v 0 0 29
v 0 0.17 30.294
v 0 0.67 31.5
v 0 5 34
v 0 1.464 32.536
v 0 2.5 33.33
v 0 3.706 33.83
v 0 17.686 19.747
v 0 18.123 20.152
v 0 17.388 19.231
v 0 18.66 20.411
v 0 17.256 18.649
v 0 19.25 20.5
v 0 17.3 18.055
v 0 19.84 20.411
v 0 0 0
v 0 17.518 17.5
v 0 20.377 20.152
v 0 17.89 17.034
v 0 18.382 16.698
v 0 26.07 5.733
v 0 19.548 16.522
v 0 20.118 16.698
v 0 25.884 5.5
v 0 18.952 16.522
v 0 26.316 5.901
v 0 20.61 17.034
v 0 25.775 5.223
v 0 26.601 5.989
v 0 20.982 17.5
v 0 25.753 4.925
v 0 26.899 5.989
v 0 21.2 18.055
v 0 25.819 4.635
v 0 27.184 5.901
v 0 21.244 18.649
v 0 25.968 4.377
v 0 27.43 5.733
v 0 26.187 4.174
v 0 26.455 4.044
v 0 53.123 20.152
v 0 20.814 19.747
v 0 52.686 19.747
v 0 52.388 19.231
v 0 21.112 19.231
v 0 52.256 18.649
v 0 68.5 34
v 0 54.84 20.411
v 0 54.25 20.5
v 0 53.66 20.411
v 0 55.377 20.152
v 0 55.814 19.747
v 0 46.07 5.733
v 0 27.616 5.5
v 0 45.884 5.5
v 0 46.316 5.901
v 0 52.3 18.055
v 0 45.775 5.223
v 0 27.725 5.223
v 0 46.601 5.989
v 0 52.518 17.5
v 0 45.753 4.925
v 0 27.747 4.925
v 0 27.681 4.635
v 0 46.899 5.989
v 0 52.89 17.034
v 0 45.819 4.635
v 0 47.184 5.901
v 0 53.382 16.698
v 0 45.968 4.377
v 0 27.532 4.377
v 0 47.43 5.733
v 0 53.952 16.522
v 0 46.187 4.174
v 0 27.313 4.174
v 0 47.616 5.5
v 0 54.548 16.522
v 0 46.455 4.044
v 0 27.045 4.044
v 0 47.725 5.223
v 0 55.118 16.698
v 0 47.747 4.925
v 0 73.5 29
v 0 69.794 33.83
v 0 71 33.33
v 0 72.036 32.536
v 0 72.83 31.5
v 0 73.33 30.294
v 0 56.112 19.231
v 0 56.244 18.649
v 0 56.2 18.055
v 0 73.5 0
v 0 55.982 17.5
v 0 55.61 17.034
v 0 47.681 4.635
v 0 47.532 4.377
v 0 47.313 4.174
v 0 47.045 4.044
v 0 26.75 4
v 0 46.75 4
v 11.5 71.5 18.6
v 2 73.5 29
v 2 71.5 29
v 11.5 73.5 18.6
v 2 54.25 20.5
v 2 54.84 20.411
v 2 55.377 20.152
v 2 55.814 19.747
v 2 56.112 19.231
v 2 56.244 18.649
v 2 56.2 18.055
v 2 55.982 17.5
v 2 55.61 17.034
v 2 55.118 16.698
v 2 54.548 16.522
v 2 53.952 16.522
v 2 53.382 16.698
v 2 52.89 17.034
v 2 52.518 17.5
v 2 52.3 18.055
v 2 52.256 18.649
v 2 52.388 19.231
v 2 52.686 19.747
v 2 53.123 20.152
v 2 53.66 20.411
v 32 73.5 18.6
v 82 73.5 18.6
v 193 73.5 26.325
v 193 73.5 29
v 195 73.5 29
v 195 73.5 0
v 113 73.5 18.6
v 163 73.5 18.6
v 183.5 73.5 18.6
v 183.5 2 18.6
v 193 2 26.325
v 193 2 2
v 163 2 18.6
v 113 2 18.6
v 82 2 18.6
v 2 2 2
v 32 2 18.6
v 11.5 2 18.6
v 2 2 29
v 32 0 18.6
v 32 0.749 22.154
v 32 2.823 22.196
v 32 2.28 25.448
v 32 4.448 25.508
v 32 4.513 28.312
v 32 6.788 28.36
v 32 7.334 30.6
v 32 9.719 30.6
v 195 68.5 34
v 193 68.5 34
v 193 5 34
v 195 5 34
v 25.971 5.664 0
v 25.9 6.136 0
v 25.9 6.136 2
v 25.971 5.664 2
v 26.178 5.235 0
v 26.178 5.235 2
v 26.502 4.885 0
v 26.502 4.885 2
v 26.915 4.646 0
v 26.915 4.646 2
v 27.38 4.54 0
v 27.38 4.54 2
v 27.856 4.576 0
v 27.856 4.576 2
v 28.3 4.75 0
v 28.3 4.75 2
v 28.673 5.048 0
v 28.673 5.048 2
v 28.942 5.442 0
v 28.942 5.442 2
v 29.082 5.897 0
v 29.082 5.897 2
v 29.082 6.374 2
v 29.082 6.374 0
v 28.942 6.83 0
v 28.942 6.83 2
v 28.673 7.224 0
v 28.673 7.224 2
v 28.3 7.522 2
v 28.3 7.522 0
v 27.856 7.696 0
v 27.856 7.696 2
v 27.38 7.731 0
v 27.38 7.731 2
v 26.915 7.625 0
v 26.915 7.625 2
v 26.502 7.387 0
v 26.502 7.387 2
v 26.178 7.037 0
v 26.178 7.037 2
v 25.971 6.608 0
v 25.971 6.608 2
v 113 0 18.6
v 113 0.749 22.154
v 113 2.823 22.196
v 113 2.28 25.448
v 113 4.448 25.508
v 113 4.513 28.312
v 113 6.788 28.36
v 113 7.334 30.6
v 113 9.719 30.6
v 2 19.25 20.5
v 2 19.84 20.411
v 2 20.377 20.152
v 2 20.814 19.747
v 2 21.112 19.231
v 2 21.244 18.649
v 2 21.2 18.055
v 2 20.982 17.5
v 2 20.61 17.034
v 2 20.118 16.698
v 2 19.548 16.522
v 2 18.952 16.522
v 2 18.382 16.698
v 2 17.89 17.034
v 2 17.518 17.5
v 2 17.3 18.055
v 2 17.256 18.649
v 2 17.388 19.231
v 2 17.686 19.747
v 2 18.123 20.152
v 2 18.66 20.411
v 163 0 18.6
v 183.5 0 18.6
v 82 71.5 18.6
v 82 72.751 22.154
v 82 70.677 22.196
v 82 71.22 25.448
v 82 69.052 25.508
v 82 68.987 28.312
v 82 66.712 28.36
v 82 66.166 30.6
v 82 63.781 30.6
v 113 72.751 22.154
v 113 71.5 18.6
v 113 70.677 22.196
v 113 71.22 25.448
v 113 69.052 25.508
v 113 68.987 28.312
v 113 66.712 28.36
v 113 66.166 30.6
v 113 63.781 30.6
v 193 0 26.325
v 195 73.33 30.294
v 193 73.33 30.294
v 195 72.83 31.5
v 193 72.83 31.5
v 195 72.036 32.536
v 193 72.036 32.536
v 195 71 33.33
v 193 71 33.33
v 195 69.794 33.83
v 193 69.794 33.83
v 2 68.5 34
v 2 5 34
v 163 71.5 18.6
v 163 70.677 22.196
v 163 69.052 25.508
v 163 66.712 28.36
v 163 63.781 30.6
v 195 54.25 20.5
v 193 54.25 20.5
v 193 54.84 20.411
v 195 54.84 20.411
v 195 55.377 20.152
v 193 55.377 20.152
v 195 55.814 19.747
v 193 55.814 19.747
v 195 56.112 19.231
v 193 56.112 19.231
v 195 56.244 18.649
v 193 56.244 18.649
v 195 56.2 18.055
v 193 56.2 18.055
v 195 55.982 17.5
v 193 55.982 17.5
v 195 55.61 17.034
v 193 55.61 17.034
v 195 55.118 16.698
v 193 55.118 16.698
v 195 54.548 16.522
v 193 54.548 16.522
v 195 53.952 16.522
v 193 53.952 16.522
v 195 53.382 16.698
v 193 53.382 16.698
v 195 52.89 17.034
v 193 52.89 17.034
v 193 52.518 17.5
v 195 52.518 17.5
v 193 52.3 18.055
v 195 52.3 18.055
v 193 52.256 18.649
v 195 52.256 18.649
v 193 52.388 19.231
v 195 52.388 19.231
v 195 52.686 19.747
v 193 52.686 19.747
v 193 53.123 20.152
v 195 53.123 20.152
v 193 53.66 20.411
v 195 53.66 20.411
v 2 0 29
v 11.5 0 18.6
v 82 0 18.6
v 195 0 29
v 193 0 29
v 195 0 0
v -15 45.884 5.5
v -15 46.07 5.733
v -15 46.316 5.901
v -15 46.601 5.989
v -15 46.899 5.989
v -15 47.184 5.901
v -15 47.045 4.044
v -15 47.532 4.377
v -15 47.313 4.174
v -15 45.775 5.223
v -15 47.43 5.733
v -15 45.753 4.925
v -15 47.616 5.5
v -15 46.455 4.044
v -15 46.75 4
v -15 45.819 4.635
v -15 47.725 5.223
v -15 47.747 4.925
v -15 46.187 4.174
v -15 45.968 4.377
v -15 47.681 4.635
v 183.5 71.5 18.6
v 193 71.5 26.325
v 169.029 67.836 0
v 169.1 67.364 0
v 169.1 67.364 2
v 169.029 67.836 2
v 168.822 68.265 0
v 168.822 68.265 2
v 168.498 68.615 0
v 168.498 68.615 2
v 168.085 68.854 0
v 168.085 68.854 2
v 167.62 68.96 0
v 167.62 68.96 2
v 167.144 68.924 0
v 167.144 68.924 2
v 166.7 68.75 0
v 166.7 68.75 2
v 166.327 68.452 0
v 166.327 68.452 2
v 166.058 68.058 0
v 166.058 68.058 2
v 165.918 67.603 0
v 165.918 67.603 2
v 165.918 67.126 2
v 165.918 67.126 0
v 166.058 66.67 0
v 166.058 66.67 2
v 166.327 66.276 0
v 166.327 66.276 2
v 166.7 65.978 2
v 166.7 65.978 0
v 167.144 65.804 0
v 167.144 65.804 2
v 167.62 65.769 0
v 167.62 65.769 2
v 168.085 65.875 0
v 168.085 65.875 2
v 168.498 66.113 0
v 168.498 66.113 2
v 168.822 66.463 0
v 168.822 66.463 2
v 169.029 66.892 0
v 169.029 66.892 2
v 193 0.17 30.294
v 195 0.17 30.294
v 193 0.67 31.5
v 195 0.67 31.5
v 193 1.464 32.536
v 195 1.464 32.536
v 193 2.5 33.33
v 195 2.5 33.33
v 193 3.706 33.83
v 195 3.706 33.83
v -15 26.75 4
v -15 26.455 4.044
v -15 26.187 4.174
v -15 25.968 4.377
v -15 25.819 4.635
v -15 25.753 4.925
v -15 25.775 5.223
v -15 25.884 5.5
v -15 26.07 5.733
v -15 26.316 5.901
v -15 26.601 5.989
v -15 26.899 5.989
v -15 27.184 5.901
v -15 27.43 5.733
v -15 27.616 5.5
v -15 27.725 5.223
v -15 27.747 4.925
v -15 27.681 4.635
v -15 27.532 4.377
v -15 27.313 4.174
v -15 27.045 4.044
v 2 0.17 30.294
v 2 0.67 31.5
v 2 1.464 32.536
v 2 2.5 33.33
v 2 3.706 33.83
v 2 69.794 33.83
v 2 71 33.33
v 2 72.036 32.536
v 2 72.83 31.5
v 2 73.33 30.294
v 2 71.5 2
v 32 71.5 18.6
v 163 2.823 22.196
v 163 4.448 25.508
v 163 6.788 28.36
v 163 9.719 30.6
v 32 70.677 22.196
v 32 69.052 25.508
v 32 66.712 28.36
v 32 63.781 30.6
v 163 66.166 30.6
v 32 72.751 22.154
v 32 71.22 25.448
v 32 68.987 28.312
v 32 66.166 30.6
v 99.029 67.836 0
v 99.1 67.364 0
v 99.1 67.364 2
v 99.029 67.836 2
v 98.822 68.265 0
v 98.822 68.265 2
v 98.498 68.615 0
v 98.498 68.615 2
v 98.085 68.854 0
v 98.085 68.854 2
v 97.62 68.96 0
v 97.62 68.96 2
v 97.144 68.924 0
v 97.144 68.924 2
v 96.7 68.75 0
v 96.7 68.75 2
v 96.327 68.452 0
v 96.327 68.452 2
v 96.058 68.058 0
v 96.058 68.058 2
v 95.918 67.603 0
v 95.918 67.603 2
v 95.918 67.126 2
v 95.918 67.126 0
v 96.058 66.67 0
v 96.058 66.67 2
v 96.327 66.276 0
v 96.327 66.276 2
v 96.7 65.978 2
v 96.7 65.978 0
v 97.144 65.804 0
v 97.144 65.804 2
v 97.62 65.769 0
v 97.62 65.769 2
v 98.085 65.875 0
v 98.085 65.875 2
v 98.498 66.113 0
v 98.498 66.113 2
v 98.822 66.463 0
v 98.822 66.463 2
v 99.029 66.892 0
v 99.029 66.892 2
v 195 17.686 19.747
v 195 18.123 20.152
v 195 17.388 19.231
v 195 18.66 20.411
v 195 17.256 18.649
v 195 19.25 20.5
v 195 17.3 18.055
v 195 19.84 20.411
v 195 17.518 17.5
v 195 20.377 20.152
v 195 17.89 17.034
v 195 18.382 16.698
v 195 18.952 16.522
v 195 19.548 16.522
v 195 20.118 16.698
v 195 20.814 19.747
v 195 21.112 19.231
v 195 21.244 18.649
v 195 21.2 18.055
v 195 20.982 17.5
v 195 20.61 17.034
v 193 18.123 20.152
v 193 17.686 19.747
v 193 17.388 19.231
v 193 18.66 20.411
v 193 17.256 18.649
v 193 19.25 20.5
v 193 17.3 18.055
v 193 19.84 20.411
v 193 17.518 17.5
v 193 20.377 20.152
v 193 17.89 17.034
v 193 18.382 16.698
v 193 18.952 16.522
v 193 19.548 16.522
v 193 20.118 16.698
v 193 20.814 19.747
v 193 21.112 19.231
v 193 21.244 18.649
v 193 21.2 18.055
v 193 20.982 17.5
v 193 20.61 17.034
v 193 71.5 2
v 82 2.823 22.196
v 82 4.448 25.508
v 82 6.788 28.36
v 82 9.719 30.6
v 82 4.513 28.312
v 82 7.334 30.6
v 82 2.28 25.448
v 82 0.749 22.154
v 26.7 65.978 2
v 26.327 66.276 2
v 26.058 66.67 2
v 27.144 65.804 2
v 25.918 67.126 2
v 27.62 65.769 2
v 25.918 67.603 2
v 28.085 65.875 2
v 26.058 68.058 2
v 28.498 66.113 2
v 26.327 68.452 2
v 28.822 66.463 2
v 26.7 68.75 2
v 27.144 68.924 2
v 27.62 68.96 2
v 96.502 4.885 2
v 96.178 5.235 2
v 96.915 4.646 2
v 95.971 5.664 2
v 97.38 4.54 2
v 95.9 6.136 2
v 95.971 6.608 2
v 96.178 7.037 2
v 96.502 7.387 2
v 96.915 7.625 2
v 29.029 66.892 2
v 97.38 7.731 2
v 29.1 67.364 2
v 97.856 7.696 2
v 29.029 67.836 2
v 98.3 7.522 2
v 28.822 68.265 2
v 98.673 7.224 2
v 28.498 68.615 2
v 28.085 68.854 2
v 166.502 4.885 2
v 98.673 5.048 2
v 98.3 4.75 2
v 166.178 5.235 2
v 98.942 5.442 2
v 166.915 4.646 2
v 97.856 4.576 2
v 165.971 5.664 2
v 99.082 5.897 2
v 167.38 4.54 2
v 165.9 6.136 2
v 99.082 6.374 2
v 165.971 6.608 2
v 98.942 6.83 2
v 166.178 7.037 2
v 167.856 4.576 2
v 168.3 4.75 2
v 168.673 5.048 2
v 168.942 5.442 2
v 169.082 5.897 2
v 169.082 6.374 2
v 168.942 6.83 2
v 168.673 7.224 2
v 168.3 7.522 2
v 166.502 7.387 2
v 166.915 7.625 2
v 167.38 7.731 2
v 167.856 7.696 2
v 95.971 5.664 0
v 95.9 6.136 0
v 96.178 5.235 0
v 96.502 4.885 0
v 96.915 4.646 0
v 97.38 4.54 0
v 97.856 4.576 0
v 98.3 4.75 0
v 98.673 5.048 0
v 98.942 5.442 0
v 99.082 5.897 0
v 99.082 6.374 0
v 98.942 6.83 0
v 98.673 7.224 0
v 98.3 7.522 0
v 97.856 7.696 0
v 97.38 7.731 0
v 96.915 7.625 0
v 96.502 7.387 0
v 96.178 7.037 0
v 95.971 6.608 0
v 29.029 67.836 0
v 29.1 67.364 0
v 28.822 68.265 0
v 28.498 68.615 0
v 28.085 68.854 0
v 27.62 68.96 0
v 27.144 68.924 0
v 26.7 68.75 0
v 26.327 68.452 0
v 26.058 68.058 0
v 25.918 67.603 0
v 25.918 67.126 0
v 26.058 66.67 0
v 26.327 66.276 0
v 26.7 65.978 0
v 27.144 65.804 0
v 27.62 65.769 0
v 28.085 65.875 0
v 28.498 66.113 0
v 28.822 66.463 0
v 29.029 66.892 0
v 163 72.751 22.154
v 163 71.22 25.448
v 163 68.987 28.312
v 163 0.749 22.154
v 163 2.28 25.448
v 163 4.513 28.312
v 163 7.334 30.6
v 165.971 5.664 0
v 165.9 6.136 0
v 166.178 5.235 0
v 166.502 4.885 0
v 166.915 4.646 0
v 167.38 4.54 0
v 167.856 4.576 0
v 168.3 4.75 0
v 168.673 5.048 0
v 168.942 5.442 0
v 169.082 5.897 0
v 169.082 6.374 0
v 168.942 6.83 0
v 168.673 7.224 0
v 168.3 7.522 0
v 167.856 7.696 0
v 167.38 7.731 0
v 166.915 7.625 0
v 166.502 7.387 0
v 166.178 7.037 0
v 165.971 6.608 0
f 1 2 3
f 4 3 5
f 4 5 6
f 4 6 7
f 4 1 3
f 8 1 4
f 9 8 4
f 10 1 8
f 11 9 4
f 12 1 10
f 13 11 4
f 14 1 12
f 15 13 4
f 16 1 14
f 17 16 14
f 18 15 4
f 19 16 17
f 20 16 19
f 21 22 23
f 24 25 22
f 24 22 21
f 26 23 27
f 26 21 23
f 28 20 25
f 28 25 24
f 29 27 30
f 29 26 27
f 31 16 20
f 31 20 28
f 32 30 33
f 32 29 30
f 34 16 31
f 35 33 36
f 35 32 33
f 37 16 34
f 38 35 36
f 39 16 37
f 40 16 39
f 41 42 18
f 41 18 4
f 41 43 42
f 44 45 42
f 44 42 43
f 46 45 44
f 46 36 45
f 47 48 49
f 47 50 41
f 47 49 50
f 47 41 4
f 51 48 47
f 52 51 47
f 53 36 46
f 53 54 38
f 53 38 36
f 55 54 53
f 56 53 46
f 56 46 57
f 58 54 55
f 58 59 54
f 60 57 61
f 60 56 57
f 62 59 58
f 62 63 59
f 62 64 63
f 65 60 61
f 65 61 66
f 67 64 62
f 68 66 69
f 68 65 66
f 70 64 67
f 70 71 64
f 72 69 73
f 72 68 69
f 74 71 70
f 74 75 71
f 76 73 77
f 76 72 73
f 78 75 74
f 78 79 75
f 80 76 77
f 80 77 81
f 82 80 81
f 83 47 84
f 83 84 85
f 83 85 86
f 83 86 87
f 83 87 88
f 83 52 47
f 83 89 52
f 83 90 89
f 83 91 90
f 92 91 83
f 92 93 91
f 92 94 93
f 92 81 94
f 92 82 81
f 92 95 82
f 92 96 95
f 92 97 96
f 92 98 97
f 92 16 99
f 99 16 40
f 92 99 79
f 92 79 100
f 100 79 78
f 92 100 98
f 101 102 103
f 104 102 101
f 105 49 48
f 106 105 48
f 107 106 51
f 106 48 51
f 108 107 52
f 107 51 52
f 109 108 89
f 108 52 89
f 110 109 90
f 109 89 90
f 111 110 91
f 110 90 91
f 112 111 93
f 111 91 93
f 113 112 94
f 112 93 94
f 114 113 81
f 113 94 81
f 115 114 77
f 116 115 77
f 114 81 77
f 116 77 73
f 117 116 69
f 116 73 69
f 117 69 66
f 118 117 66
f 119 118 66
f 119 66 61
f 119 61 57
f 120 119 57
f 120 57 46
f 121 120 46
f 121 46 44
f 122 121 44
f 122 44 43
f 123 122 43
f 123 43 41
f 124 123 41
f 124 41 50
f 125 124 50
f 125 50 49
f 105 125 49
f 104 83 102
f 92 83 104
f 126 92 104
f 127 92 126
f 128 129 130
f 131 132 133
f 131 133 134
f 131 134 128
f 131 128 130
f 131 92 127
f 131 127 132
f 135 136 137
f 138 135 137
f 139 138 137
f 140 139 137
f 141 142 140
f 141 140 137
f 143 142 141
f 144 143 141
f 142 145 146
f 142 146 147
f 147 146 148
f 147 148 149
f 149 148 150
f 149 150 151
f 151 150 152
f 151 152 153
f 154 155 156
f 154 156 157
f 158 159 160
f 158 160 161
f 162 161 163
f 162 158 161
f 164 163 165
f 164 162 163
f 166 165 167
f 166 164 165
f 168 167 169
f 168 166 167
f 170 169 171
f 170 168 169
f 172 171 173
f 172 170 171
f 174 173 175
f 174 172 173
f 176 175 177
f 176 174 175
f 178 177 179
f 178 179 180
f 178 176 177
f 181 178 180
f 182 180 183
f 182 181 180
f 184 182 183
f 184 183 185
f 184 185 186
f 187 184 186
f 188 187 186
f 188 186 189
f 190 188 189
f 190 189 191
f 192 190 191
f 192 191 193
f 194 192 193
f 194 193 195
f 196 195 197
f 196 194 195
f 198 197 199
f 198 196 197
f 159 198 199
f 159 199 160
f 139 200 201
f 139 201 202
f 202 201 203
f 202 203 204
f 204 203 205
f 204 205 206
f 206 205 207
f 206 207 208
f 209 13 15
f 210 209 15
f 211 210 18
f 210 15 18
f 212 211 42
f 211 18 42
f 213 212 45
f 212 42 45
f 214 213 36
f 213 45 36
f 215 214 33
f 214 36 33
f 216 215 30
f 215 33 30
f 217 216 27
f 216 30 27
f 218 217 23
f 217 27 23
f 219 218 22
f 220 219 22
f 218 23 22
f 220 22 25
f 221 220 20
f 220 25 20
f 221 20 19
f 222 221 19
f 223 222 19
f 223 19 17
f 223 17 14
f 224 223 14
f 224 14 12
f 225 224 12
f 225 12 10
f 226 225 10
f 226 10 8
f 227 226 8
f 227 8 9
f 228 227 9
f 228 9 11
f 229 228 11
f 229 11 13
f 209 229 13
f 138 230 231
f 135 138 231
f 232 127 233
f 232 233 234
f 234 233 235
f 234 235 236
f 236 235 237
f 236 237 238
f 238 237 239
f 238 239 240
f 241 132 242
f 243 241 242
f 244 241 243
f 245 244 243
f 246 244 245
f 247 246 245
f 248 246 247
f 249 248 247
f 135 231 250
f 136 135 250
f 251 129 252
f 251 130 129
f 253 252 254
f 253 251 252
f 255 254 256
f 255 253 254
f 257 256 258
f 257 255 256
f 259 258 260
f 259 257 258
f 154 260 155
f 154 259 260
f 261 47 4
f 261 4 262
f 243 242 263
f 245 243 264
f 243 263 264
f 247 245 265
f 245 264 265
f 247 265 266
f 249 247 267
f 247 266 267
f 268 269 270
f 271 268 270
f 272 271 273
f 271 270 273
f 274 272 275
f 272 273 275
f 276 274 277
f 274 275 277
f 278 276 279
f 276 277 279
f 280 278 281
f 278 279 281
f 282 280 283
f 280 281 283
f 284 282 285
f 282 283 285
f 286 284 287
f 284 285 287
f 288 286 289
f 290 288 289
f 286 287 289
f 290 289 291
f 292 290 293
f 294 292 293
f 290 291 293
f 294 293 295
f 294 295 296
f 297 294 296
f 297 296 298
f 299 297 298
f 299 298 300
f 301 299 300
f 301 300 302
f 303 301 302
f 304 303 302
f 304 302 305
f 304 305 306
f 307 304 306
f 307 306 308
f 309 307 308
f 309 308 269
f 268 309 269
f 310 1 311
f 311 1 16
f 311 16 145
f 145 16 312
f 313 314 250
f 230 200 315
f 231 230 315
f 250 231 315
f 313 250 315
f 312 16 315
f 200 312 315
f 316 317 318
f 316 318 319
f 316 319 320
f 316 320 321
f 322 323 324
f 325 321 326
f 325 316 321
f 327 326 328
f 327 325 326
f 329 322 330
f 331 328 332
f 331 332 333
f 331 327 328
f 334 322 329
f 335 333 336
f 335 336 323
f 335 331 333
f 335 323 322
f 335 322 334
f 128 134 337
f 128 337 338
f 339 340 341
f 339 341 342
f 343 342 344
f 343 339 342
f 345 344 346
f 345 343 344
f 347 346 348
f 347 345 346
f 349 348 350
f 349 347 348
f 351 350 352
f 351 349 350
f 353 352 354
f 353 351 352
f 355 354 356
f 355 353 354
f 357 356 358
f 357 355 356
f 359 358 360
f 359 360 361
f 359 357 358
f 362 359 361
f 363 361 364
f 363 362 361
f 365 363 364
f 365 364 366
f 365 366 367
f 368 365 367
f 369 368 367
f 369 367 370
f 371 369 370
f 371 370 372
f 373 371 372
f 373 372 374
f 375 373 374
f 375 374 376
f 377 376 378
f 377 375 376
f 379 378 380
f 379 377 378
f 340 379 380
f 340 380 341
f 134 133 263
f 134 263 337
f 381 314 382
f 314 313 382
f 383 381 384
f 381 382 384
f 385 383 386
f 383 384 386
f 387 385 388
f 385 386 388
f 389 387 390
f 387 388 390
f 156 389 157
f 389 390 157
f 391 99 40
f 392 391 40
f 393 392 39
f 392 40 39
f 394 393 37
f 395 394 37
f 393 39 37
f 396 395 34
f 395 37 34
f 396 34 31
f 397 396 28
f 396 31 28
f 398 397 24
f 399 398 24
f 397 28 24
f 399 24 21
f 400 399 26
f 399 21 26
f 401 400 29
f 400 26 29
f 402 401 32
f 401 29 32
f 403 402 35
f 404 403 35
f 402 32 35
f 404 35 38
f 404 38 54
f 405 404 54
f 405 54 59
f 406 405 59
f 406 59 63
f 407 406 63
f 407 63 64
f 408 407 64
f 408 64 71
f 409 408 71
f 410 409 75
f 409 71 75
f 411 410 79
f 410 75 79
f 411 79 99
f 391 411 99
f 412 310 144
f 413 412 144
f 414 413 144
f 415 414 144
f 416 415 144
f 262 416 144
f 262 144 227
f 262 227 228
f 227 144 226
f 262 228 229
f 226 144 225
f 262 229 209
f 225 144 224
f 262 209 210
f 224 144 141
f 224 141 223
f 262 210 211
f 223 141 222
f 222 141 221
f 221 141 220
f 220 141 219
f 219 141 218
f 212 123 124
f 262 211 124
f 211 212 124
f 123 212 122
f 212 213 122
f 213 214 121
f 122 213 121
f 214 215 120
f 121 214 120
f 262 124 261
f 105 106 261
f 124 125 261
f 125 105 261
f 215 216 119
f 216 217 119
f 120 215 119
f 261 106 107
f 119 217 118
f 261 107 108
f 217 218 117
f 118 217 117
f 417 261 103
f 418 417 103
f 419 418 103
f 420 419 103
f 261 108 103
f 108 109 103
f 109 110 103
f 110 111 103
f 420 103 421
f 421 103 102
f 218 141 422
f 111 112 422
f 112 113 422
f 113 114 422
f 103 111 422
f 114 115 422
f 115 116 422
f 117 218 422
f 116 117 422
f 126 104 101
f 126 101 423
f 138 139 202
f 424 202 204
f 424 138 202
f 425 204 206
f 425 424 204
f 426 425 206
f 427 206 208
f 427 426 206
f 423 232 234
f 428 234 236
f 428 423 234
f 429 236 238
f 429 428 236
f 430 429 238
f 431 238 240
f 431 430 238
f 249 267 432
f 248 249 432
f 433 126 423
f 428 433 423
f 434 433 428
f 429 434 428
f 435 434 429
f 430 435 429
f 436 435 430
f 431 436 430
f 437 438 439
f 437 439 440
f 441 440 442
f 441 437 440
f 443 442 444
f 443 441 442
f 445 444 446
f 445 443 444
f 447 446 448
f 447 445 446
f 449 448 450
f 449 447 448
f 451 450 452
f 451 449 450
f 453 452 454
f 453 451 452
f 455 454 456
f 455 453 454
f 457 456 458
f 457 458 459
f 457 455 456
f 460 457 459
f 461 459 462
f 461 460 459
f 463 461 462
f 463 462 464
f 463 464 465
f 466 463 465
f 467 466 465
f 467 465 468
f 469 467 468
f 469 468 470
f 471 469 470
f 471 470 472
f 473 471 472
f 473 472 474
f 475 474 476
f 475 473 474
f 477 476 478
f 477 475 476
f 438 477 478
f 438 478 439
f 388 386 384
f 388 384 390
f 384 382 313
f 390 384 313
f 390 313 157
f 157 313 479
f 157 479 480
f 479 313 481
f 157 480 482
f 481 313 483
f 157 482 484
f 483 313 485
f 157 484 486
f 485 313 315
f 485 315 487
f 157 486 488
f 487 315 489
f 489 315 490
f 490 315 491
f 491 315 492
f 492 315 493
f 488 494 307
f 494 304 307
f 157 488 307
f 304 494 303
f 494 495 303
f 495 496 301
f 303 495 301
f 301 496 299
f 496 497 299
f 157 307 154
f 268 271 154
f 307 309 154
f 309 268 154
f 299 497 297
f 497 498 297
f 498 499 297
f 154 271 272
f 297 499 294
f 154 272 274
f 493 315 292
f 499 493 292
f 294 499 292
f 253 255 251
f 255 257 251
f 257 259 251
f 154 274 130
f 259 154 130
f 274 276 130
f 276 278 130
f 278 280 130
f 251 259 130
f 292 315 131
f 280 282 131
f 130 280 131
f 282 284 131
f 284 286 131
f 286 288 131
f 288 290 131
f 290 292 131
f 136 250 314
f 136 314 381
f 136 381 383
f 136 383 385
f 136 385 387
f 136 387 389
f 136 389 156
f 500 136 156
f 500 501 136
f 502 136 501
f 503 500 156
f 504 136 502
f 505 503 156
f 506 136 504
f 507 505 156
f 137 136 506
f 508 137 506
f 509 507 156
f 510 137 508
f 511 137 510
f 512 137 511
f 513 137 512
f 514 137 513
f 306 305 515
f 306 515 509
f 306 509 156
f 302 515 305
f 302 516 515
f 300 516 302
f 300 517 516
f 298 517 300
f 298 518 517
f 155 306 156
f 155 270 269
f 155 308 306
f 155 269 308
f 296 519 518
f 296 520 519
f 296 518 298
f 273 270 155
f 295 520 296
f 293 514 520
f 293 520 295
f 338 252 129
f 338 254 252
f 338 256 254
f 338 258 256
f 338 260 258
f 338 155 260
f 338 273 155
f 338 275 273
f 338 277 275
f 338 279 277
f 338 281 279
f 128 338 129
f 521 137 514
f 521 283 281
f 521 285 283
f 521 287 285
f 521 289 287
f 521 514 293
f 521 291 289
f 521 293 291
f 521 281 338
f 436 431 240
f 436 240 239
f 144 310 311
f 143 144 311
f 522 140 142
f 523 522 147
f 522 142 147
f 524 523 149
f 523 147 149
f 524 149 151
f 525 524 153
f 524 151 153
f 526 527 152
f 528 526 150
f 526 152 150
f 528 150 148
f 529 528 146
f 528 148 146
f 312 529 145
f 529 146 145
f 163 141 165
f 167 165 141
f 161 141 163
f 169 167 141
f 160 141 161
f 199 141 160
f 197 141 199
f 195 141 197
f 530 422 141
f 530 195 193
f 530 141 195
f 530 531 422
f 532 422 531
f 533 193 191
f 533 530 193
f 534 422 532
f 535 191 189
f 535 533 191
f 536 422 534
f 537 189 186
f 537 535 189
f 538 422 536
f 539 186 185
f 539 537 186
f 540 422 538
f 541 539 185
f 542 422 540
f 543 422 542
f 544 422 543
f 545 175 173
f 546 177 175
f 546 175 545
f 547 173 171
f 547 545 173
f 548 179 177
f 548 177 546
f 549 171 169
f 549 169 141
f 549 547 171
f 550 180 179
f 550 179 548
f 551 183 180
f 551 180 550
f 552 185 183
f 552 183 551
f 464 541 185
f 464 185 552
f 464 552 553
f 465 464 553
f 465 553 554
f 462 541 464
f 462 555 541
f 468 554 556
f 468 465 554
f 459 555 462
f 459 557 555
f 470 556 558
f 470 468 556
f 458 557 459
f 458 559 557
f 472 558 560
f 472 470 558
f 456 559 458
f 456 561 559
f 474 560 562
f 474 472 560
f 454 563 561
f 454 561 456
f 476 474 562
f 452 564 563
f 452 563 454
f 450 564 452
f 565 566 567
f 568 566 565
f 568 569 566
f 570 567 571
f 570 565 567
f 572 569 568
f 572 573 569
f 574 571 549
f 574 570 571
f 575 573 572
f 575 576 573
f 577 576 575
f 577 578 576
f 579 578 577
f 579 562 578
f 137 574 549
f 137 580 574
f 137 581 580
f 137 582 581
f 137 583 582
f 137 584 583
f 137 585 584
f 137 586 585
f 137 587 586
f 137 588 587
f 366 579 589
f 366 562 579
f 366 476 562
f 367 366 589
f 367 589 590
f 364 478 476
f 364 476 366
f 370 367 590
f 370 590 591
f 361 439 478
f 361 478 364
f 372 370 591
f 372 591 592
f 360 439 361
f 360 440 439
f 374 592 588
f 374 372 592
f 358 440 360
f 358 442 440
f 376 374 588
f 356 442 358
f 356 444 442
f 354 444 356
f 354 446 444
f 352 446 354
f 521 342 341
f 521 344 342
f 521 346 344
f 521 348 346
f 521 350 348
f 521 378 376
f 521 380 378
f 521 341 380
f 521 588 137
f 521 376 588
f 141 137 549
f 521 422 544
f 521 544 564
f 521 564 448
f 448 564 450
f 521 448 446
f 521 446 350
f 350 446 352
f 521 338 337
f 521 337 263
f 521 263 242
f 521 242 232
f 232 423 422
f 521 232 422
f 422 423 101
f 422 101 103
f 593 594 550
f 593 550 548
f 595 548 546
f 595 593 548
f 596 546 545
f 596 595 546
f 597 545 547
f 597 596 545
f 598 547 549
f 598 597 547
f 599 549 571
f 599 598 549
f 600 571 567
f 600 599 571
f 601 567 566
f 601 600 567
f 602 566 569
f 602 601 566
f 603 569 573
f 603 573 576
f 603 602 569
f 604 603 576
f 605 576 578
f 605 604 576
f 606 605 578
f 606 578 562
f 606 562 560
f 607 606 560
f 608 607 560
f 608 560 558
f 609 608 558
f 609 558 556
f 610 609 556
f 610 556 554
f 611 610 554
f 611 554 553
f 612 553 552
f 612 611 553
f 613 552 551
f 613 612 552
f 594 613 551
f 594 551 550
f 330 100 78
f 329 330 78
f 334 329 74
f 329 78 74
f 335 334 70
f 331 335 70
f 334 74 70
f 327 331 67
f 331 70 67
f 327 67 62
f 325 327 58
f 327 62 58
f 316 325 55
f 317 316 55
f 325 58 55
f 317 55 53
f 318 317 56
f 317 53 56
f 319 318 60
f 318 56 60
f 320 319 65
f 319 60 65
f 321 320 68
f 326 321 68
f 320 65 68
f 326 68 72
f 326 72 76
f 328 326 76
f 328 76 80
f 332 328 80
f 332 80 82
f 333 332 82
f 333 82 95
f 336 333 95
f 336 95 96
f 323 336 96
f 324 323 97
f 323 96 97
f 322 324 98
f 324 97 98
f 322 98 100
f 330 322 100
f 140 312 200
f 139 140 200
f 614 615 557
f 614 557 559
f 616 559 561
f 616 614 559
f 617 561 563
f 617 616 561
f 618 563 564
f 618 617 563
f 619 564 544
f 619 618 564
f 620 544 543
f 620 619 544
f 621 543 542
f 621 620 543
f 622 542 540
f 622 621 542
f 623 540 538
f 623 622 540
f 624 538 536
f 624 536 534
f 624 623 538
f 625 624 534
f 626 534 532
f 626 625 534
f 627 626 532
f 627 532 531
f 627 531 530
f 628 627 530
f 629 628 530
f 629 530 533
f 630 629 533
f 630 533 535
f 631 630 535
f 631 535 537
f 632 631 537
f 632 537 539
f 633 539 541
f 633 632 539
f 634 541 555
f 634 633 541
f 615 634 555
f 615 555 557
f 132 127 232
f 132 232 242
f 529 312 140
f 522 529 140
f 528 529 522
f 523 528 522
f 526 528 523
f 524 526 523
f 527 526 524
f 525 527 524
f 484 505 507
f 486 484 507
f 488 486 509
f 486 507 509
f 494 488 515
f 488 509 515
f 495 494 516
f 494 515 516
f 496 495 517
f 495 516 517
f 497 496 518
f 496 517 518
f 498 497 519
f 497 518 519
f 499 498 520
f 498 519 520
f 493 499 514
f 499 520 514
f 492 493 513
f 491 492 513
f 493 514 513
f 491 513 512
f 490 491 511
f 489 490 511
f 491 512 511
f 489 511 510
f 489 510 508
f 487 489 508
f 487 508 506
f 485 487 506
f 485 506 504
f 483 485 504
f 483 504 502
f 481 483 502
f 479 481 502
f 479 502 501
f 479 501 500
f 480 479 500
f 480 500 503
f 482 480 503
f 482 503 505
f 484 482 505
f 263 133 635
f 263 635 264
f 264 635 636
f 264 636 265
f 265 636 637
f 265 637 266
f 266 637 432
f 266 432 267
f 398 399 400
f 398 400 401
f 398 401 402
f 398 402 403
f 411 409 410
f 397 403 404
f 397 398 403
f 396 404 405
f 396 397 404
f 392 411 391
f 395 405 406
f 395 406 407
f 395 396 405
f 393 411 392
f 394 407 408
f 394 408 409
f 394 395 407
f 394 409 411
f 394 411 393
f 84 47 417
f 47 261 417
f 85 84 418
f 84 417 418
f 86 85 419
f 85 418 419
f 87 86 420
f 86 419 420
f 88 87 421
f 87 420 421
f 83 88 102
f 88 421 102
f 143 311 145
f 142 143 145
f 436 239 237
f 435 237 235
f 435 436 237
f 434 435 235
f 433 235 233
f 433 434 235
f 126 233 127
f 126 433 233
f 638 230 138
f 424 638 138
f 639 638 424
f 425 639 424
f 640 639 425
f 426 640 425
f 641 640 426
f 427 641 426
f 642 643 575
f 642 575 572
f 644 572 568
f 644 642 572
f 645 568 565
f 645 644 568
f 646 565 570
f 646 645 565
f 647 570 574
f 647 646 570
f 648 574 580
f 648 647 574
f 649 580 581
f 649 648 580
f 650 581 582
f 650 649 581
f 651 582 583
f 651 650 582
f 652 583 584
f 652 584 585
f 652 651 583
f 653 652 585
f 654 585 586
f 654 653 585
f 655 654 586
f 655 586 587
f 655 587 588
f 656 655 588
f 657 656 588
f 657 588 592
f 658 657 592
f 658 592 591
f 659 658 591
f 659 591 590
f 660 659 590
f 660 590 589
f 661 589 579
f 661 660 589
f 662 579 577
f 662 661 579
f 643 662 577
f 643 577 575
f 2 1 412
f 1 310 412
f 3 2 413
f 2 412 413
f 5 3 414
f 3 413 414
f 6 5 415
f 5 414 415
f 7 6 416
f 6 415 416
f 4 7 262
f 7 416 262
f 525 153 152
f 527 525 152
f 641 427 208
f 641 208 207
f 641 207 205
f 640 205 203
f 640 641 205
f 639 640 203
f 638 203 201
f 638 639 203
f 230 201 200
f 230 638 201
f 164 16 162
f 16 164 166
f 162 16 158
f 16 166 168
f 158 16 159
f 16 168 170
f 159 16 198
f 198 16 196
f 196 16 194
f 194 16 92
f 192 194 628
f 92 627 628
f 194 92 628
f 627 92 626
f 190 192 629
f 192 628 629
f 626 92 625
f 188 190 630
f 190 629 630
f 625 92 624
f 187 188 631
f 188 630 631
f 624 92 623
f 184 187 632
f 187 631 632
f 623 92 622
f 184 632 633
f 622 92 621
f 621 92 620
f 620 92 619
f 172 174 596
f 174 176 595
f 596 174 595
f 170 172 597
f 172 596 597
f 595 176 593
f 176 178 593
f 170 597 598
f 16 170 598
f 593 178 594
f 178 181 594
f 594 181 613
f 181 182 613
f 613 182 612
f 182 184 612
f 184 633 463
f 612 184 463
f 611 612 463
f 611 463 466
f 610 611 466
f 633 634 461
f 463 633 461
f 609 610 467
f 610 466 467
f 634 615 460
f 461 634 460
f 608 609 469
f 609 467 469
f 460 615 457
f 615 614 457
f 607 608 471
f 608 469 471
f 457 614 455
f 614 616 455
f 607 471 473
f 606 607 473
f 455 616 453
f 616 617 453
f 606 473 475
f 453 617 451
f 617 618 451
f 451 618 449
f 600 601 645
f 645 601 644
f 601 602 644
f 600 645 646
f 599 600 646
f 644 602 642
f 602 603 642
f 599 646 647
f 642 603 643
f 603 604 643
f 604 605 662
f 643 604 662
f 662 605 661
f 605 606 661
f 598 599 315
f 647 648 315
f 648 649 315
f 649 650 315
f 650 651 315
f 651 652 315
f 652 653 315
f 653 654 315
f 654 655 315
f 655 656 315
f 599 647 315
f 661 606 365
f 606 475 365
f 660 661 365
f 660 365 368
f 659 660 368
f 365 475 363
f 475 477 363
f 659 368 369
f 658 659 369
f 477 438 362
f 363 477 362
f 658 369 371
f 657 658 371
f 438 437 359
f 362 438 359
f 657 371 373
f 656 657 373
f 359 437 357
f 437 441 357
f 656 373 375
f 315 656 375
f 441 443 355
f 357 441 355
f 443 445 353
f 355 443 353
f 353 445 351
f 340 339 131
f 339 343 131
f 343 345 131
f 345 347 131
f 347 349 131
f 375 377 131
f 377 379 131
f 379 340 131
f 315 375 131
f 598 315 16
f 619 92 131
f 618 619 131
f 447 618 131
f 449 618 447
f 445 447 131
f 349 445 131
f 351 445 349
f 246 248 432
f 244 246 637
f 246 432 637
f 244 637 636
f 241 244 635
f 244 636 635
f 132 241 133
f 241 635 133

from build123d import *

# Parameters (mm, degrees)
SKETCH1_W            = 195
SKETCH1_H            = 73.5
SKETCH1_R            = 1.6
BOSS_EXTRUDE1_DEPTH  = 2
SKETCH2_W            = 2
SKETCH2_H            = 73.5
BOSS_EXTRUDE2_DEPTH  = 32
BOSS_EXTRUDE3_DEPTH  = 2
BOSS_EXTRUDE4_DEPTH  = 50
MIRROR3_COPY_1_DEPTH = 50
FILLET1_R            = 5
SKETCH6_R            = 1
BOSS_EXTRUDE5_DEPTH  = 15
SKETCH7_R            = 2
CUT_EXTRUDE1_DEPTH   = 212.147460321


with BuildPart() as part:
    # Sketch1 → Boss-Extrude1 (new body)
    with BuildSketch(Plane.XY):
        with Locations((97.5, 36.75)):
            Rectangle(SKETCH1_W, SKETCH1_H)
        with Locations((27.5, 67.364107359)):
            Circle(SKETCH1_R, mode=Mode.SUBTRACT)
        with Locations((97.5, 67.364107359)):
            Circle(SKETCH1_R, mode=Mode.SUBTRACT)
        with Locations((167.5, 67.364107359)):
            Circle(SKETCH1_R, mode=Mode.SUBTRACT)
        with Locations(Location((167.5, 6.135892641, 0), (0, 0, 180))):
            Circle(SKETCH1_R, mode=Mode.SUBTRACT)
        with Locations(Location((97.5, 6.135892641, 0), (0, 0, 180))):
            Circle(SKETCH1_R, mode=Mode.SUBTRACT)
        with Locations(Location((27.5, 6.135892641, 0), (0, 0, 180))):
            Circle(SKETCH1_R, mode=Mode.SUBTRACT)
    extrude(amount=BOSS_EXTRUDE1_DEPTH)

    # Sketch2 → Boss-Extrude2 (add)
    with BuildSketch(Plane.XY.offset(2)):
        with Locations((1, 36.75)):
            Rectangle(SKETCH2_W, SKETCH2_H)
        with Locations((194, 36.75)):
            Rectangle(SKETCH2_W, SKETCH2_H)
    extrude(amount=BOSS_EXTRUDE2_DEPTH)

    # Sketch3 → Boss-Extrude3 (add)
    with BuildSketch(Plane.XZ):
        Polygon((0, 0), (0, 29), (2, 29), (11.5, 18.6), (183.5, 18.6), (193, 26.325039357), (195, 26.325039357), (195, 0), align=None)
    boss_extrude3 = extrude(amount=-BOSS_EXTRUDE3_DEPTH)

    # Mirror1: Boss-Extrude3 across plane
    add(boss_extrude3.mirror(Plane(origin=(0, 36.75, 0), x_dir=(0, 0, 1), z_dir=(0, -1, 0))))

    # 3DSketch1 → Boss-Extrude4 (add)
    with BuildSketch(Plane(origin=(32, 0, 18.6), x_dir=(0, 0.995265198446773, -0.09719662936905633), z_dir=(1, 0, 0))):
        with BuildLine():
            Line((0, 0), (1.990530397, 0.194393259))
            ThreePointArc((1.990530397, 0.194393259), (3.755453085, 7.307606505), (8.506639352, 12.887838028))
            Line((8.506639352, 12.887838028), (6.133305317, 12.656060539))
            ThreePointArc((6.133305317, 12.656060539), (1.603781504, 7.03695825), (0, 0))
        make_face()
    boss_extrude4 = extrude(amount=BOSS_EXTRUDE4_DEPTH)

    # Mirror2: Boss-Extrude4 across plane
    add(boss_extrude4.mirror(Plane(origin=(97.5, 0, 0), x_dir=(0, 0, 1), z_dir=(1, 0, 0))))

    # Mirror3: Boss-Extrude4 across plane
    add(boss_extrude4.mirror(Plane(origin=(0, 36.75, 0), x_dir=(0, 0, 1), z_dir=(0, -1, 0))))

    # Mirror3 copy 1 sketch → Mirror3 copy 1 (add)
    with BuildSketch(Plane(origin=(163, 73.5, 18.6), x_dir=(0, -0.995265198446773, -0.09719662936905633), z_dir=(-1, 0, 0))):
        with BuildLine():
            Line((0, 0), (1.990530397, 0.194393259))
            ThreePointArc((1.990530397, 0.194393259), (3.755453085, 7.307606505), (8.506639352, 12.887838028))
            Line((8.506639352, 12.887838028), (6.133305317, 12.656060539))
            ThreePointArc((6.133305317, 12.656060539), (1.603781504, 7.03695825), (0, 0))
        make_face()
    extrude(amount=MIRROR3_COPY_1_DEPTH)

    # Fillet1
    fillet1_edges = [part.edges().sort_by_distance(p)[0] for p in [
        (1, 0, 34),
        (1, 73.5, 34),
        (194, 73.5, 34),
        (194, 0, 34),
    ]]
    fillet(fillet1_edges, radius=FILLET1_R)

    # Sketch6 → Boss-Extrude5 (add)
    with BuildSketch(Plane.ZY):
        with Locations(Location((5, 46.75, 0), (0, 0, 180))):
            Circle(SKETCH6_R)
        with Locations(Location((5, 26.75, 0), (0, 0, 180))):
            Circle(SKETCH6_R)
    extrude(amount=BOSS_EXTRUDE5_DEPTH)

    # Sketch7 → Cut-Extrude1 (cut, through all)
    with BuildSketch(Plane.ZY):
        with Locations((18.5, 54.25)):
            Circle(SKETCH7_R)
        with Locations((18.5, 19.25)):
            Circle(SKETCH7_R)
    extrude(amount=-CUT_EXTRUDE1_DEPTH, mode=Mode.SUBTRACT)


solid = part.part
